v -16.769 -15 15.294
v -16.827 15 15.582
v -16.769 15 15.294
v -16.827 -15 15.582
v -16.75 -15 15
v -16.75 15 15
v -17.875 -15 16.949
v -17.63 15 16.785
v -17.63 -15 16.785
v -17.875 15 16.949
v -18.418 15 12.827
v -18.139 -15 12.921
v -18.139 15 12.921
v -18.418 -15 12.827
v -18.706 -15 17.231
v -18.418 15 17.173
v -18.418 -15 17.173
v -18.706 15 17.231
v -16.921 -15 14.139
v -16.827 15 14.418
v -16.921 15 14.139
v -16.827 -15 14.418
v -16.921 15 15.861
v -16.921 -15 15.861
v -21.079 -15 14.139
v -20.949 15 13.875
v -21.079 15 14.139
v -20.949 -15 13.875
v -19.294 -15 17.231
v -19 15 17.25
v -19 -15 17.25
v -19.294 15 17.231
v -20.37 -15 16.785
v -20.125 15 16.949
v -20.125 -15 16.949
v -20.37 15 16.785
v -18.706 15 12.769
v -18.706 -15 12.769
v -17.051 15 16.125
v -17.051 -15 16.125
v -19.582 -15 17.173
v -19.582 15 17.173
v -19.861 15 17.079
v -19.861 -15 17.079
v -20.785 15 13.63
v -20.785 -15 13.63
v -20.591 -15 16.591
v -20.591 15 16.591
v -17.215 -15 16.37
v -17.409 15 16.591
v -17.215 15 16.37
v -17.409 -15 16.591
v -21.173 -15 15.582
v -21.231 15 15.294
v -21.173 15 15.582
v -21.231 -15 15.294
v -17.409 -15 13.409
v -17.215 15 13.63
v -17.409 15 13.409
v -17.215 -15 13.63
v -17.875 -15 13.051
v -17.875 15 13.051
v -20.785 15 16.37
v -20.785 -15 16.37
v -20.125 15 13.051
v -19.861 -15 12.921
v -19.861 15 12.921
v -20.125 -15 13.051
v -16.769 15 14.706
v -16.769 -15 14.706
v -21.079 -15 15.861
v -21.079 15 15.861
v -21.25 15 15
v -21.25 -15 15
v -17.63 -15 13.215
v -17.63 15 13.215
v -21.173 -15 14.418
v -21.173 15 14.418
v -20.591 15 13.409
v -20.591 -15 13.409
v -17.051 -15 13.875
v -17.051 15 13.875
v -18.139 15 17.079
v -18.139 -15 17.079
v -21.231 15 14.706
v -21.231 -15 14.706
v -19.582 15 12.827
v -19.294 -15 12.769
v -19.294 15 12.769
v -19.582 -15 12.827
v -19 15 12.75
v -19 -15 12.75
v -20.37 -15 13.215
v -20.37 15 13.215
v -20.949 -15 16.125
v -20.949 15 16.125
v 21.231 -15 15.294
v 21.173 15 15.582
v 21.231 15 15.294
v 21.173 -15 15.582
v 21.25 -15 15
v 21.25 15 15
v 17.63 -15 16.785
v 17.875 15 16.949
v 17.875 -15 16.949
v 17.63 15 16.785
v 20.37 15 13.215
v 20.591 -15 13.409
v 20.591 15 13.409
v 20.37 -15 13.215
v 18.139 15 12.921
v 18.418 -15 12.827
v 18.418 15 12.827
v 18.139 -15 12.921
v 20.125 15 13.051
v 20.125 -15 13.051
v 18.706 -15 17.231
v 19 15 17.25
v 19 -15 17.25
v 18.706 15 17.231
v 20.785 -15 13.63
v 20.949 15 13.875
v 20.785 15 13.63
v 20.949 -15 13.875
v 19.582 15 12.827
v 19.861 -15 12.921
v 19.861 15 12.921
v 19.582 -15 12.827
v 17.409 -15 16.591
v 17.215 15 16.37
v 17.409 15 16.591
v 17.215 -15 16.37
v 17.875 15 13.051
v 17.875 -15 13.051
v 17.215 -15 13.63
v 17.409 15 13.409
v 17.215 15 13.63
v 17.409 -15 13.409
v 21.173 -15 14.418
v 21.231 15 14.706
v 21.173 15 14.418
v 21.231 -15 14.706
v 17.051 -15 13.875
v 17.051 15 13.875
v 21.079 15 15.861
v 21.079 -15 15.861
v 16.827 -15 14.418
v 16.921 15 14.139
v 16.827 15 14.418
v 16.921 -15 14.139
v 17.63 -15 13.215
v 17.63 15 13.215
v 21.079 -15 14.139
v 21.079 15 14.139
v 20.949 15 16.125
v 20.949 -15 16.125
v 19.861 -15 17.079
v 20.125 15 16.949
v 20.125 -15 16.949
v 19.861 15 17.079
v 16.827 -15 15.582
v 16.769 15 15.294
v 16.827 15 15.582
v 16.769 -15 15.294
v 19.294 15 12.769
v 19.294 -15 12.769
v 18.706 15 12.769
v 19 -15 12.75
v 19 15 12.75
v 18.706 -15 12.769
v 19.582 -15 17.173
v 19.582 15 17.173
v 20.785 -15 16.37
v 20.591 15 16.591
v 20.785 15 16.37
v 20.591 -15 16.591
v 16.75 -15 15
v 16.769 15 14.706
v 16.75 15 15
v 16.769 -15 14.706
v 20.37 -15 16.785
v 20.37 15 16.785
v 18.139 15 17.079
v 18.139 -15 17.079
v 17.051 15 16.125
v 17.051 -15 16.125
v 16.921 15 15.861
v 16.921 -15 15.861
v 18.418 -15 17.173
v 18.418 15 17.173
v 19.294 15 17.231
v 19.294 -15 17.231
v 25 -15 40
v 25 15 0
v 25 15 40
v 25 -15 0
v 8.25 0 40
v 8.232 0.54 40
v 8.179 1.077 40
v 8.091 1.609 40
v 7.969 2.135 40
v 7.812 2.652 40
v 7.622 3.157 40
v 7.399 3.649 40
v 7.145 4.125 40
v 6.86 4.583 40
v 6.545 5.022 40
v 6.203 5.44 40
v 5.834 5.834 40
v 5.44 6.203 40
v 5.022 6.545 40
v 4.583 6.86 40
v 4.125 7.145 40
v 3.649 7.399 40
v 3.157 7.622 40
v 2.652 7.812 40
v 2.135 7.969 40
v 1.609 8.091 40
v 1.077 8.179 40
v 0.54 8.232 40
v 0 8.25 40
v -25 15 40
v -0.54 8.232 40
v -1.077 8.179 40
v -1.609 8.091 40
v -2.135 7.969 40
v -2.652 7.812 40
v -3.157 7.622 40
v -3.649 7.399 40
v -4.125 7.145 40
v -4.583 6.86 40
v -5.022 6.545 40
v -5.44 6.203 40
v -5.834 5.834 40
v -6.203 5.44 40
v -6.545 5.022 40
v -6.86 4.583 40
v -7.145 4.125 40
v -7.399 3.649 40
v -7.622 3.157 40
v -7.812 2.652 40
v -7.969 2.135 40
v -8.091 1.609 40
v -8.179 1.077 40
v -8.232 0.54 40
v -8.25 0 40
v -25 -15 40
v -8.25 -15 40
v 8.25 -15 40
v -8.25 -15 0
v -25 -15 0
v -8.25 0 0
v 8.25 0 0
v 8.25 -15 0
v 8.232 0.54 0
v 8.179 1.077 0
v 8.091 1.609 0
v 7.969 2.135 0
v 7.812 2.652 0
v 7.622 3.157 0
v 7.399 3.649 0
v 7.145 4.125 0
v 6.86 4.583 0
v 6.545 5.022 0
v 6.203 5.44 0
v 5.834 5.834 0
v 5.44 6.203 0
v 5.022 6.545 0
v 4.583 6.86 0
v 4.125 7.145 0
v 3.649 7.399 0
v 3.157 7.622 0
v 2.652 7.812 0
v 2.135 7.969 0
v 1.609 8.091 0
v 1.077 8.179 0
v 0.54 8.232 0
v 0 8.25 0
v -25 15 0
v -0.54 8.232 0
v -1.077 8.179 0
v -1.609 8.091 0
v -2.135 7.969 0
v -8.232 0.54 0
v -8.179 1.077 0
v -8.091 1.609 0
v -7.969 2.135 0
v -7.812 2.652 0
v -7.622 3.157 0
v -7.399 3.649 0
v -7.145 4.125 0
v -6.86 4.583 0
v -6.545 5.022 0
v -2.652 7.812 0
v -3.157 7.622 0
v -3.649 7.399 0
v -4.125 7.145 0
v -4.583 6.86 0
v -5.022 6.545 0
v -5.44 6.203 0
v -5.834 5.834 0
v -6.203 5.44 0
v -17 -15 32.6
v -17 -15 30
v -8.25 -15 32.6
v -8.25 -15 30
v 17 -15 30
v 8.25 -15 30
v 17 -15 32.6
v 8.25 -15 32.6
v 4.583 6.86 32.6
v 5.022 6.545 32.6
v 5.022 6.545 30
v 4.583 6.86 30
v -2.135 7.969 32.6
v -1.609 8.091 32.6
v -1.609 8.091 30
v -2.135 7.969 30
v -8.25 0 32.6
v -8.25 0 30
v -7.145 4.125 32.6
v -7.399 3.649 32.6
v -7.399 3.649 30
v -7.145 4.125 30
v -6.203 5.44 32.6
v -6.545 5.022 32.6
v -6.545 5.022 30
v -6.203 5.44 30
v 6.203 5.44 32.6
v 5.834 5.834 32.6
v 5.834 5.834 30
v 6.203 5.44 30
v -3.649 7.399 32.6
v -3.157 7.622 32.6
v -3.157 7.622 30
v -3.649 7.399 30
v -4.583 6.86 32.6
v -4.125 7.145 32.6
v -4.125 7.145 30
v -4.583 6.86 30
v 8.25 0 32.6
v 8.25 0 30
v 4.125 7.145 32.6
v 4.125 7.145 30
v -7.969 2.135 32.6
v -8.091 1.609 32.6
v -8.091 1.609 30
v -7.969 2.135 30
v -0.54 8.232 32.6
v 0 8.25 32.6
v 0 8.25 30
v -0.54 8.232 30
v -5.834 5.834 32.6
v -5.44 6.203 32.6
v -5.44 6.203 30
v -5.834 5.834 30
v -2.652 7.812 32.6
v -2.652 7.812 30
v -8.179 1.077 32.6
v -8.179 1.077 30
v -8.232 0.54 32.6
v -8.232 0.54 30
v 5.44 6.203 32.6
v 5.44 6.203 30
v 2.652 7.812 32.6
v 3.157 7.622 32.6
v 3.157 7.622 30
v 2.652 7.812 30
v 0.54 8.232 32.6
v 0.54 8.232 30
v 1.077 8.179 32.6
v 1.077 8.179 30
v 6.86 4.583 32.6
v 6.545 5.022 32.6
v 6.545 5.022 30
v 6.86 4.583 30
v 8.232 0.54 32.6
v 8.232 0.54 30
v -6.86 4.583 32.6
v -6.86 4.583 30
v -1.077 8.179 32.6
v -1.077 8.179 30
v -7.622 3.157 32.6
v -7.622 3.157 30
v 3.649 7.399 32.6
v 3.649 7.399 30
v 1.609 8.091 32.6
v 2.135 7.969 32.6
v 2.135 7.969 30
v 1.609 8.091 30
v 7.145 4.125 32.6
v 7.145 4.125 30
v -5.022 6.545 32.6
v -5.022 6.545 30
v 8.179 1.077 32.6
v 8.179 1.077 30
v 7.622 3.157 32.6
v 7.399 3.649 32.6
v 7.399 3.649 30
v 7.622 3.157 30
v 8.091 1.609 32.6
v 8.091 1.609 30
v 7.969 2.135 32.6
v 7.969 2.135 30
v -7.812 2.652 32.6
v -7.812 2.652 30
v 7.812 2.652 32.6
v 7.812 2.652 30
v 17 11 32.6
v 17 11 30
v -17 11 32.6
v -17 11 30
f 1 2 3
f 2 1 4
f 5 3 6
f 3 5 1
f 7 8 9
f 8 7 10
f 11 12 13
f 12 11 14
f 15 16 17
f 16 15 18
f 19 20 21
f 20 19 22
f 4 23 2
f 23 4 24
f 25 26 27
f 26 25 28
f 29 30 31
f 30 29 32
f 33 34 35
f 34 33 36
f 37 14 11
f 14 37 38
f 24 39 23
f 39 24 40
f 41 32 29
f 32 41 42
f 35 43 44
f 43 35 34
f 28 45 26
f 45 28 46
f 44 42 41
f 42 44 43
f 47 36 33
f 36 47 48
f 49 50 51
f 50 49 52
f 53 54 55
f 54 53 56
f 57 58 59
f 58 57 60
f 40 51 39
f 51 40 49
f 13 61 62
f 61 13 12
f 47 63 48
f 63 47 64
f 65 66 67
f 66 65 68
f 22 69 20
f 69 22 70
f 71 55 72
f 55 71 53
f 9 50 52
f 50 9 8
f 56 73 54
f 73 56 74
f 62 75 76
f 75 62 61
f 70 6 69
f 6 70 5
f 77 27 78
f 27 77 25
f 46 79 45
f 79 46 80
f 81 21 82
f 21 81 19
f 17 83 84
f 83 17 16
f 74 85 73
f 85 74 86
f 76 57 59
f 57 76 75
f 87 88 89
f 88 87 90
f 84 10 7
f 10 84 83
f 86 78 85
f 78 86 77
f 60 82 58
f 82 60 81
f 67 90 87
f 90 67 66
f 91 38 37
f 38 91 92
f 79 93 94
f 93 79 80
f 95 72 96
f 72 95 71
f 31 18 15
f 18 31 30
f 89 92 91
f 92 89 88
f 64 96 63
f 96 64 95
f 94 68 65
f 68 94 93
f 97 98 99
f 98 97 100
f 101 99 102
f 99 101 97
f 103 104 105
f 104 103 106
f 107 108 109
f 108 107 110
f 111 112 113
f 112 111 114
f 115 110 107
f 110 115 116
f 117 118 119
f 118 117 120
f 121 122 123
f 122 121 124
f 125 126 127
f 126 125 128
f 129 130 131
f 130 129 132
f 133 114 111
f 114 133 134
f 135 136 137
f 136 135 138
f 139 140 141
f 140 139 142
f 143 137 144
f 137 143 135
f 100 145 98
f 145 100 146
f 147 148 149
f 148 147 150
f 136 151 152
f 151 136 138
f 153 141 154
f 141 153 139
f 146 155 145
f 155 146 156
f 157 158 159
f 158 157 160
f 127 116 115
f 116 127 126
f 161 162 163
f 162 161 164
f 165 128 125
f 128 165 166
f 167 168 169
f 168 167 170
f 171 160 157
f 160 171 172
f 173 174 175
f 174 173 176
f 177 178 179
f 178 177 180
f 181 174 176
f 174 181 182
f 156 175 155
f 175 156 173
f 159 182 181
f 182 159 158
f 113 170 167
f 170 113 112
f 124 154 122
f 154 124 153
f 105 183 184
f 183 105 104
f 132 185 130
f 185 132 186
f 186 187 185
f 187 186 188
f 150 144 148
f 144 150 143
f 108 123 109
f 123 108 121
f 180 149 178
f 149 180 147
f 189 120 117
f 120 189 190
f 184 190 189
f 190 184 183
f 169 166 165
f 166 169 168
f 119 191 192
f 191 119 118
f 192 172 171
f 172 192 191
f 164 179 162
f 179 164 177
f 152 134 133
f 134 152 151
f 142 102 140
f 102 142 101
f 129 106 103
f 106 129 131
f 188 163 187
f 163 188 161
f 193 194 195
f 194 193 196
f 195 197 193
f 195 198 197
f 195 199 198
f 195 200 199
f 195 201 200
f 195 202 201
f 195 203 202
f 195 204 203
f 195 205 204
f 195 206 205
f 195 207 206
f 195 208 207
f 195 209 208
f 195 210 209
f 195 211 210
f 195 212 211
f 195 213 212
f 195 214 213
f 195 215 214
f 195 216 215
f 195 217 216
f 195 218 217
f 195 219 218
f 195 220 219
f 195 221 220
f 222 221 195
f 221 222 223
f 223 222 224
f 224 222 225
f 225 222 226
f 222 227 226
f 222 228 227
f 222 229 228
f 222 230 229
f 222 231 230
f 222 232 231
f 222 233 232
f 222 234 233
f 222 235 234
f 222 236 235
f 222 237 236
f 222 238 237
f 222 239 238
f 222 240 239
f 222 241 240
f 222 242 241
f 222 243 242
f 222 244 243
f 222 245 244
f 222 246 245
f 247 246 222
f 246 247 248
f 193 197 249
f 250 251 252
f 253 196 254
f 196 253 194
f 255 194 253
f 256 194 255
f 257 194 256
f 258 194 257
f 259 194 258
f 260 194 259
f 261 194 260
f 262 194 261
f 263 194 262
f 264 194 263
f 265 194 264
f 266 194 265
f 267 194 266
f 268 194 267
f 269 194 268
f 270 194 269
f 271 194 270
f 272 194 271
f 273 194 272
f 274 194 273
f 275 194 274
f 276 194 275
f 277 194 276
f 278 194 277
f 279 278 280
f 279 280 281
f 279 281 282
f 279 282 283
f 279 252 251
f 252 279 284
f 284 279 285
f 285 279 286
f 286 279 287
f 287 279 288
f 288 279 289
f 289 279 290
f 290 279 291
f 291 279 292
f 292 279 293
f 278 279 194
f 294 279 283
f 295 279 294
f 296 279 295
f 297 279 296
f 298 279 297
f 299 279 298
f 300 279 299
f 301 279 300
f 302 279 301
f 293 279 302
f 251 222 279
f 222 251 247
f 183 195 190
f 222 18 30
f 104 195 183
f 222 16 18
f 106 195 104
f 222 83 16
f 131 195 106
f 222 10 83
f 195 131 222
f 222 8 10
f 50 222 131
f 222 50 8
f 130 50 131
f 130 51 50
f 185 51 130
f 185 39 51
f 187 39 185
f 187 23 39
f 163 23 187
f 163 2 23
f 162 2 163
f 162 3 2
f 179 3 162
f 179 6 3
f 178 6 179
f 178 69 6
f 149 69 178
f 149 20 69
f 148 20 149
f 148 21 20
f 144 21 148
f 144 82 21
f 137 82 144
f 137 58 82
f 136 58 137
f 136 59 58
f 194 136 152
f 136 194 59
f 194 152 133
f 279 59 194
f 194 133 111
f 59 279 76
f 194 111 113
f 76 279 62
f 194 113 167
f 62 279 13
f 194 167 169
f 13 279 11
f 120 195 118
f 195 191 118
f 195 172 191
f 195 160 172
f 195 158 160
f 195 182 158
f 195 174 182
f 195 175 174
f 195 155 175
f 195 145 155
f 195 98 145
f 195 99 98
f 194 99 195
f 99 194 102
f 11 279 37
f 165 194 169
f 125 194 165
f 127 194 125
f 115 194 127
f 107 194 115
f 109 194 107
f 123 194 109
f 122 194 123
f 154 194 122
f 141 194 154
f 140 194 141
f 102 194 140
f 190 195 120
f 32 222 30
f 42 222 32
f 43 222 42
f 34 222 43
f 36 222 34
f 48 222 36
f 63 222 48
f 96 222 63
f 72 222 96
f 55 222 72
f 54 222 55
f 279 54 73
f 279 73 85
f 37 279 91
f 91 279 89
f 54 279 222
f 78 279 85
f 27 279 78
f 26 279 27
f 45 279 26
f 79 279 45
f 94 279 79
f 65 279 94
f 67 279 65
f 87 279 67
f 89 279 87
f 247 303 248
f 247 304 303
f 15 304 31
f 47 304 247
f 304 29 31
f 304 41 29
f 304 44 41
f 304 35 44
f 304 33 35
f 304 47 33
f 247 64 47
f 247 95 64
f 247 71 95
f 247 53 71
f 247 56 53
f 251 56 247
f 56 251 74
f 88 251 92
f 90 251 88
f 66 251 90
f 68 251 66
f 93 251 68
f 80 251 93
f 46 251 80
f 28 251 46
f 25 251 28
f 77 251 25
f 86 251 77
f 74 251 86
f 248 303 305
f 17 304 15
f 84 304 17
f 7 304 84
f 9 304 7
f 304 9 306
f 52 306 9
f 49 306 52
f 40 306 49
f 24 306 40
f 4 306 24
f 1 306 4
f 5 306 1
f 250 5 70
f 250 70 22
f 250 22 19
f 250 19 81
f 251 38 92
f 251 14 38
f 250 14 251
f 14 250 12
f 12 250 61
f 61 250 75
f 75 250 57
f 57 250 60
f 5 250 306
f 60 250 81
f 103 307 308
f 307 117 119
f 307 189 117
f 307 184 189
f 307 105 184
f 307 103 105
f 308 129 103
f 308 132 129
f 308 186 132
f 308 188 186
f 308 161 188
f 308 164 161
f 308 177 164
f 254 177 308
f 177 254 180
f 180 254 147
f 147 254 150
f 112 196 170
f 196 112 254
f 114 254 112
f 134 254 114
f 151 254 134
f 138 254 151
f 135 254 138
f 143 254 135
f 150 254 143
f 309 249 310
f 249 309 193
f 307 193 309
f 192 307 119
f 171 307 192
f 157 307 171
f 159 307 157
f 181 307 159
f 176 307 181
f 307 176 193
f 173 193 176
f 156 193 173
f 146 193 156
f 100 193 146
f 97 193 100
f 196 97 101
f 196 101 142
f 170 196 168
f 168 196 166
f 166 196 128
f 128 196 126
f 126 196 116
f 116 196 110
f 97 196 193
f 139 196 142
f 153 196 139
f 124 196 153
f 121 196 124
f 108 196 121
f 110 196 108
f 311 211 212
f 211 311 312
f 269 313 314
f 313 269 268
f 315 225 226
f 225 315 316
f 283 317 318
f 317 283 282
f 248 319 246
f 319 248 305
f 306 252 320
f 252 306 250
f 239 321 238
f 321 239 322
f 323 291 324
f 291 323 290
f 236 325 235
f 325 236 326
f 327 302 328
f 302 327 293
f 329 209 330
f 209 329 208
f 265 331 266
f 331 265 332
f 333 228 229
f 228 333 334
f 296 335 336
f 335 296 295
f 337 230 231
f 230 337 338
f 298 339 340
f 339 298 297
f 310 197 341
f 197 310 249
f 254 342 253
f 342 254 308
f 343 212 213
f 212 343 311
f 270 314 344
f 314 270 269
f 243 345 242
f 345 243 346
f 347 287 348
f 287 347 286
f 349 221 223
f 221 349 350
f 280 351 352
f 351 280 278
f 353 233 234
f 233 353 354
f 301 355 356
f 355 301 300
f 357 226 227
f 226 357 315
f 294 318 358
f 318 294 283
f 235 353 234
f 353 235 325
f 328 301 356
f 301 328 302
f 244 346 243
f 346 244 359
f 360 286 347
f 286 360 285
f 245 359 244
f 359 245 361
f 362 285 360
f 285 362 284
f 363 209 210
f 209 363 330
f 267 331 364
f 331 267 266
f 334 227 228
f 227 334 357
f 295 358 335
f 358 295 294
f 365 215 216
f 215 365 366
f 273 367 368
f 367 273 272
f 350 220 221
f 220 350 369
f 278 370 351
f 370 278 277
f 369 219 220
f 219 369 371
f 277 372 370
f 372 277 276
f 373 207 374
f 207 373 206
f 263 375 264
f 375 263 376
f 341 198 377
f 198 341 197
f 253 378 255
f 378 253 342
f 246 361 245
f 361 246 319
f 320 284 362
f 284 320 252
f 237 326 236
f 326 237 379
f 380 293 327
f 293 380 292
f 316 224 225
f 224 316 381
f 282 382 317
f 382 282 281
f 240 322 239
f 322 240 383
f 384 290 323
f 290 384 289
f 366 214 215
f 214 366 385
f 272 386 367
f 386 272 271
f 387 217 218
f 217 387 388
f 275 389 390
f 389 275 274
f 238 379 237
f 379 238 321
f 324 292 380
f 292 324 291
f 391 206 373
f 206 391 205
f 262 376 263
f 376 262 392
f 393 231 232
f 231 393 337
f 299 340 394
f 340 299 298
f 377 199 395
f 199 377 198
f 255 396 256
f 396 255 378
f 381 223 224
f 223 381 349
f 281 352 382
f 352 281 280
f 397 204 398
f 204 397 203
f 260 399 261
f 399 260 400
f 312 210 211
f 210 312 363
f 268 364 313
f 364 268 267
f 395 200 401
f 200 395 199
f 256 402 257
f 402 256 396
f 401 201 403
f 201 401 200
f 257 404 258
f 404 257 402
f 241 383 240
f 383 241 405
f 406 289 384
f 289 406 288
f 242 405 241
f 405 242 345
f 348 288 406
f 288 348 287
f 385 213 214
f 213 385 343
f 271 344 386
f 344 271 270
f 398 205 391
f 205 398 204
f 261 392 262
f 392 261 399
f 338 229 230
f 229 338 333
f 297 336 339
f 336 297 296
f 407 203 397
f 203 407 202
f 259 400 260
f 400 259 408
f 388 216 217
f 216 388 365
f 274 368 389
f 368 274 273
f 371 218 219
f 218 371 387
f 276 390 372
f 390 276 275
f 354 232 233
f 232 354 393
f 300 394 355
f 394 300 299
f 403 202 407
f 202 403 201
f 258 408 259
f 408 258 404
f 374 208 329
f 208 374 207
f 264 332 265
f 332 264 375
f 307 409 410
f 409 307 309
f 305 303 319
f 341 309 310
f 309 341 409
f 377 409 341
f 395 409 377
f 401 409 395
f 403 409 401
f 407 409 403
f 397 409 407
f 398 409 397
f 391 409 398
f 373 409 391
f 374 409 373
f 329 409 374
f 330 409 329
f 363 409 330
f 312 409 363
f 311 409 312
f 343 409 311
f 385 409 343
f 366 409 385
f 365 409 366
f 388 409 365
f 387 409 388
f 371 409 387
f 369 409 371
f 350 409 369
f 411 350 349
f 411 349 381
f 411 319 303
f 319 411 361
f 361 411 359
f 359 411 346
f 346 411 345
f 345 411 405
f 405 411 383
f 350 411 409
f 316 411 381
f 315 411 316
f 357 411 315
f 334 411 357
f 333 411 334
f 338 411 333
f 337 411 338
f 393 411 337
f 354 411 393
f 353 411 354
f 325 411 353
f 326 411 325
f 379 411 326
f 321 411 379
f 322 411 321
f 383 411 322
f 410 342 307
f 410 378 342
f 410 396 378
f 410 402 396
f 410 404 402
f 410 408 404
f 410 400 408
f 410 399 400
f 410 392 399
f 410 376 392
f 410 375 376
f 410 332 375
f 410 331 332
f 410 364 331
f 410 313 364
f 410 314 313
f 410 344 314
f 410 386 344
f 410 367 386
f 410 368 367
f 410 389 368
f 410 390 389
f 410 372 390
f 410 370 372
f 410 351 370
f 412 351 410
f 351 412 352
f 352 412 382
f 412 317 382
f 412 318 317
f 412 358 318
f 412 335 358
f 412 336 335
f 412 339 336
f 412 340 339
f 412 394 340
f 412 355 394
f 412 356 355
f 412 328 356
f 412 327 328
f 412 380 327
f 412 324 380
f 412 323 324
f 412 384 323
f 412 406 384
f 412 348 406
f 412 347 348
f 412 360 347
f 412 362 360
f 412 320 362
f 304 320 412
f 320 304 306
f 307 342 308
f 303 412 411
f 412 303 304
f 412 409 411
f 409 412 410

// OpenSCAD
// Wall-mounted holder for a 10 mL syringe hanging upright, tip down (gravity-feed reservoir)
// Category: hardware. A block with a vertical U-shaped barrel channel open at the front, a
// horizontal slot that takes the finger flange, and two M4 wall-screw holes from front to back.
// Print: PETG or PLA, standing on its bottom face; the flange slot roof bridges 34 mm.
// SPDX-License-Identifier: CERN-OHL-P-2.0

/* [Holder] */
block = [50, 30, 40];     // X (width), Y (depth), Z (height) [mm]; back face at y = +15
channel_w = 16.5;         // 16 mm barrel + clearance; half-circle back end centred at (0, 0)
slot = [34, 2.6];         // flange slot width (X) and height (Z)
slot_z = 30;              // slot from z = 30 to 32.6
slot_back_y = 11;         // the slot reaches from the front face back to y = 11
screw_d = 4.5;            // M4 clearance
screw_x = 19;
screw_z = 15;

/* [Hidden] */
eps = 0.01;

difference() {
    translate([-block.x / 2, -block.y / 2, 0]) cube(block);
    // barrel channel, open toward -Y (the front)
    translate([0, 0, -1]) linear_extrude(block.z + 2) {
        circle(d = channel_w, $fn = 96);
        translate([-channel_w / 2, -block.y / 2 - 1]) square([channel_w, block.y / 2 + 1]);
    }
    // flange slot, cut in from the front face
    translate([-slot.x / 2, -block.y / 2 - 1, slot_z]) cube([slot.x, slot_back_y + block.y / 2 + 1, slot.y]);
    // wall-screw holes, front to back
    for (s = [-1, 1])
        translate([s * screw_x, 0, screw_z]) rotate([90, 0, 0])
            cylinder(d = screw_d, h = block.y + 2, center = true, $fn = 48);
}
